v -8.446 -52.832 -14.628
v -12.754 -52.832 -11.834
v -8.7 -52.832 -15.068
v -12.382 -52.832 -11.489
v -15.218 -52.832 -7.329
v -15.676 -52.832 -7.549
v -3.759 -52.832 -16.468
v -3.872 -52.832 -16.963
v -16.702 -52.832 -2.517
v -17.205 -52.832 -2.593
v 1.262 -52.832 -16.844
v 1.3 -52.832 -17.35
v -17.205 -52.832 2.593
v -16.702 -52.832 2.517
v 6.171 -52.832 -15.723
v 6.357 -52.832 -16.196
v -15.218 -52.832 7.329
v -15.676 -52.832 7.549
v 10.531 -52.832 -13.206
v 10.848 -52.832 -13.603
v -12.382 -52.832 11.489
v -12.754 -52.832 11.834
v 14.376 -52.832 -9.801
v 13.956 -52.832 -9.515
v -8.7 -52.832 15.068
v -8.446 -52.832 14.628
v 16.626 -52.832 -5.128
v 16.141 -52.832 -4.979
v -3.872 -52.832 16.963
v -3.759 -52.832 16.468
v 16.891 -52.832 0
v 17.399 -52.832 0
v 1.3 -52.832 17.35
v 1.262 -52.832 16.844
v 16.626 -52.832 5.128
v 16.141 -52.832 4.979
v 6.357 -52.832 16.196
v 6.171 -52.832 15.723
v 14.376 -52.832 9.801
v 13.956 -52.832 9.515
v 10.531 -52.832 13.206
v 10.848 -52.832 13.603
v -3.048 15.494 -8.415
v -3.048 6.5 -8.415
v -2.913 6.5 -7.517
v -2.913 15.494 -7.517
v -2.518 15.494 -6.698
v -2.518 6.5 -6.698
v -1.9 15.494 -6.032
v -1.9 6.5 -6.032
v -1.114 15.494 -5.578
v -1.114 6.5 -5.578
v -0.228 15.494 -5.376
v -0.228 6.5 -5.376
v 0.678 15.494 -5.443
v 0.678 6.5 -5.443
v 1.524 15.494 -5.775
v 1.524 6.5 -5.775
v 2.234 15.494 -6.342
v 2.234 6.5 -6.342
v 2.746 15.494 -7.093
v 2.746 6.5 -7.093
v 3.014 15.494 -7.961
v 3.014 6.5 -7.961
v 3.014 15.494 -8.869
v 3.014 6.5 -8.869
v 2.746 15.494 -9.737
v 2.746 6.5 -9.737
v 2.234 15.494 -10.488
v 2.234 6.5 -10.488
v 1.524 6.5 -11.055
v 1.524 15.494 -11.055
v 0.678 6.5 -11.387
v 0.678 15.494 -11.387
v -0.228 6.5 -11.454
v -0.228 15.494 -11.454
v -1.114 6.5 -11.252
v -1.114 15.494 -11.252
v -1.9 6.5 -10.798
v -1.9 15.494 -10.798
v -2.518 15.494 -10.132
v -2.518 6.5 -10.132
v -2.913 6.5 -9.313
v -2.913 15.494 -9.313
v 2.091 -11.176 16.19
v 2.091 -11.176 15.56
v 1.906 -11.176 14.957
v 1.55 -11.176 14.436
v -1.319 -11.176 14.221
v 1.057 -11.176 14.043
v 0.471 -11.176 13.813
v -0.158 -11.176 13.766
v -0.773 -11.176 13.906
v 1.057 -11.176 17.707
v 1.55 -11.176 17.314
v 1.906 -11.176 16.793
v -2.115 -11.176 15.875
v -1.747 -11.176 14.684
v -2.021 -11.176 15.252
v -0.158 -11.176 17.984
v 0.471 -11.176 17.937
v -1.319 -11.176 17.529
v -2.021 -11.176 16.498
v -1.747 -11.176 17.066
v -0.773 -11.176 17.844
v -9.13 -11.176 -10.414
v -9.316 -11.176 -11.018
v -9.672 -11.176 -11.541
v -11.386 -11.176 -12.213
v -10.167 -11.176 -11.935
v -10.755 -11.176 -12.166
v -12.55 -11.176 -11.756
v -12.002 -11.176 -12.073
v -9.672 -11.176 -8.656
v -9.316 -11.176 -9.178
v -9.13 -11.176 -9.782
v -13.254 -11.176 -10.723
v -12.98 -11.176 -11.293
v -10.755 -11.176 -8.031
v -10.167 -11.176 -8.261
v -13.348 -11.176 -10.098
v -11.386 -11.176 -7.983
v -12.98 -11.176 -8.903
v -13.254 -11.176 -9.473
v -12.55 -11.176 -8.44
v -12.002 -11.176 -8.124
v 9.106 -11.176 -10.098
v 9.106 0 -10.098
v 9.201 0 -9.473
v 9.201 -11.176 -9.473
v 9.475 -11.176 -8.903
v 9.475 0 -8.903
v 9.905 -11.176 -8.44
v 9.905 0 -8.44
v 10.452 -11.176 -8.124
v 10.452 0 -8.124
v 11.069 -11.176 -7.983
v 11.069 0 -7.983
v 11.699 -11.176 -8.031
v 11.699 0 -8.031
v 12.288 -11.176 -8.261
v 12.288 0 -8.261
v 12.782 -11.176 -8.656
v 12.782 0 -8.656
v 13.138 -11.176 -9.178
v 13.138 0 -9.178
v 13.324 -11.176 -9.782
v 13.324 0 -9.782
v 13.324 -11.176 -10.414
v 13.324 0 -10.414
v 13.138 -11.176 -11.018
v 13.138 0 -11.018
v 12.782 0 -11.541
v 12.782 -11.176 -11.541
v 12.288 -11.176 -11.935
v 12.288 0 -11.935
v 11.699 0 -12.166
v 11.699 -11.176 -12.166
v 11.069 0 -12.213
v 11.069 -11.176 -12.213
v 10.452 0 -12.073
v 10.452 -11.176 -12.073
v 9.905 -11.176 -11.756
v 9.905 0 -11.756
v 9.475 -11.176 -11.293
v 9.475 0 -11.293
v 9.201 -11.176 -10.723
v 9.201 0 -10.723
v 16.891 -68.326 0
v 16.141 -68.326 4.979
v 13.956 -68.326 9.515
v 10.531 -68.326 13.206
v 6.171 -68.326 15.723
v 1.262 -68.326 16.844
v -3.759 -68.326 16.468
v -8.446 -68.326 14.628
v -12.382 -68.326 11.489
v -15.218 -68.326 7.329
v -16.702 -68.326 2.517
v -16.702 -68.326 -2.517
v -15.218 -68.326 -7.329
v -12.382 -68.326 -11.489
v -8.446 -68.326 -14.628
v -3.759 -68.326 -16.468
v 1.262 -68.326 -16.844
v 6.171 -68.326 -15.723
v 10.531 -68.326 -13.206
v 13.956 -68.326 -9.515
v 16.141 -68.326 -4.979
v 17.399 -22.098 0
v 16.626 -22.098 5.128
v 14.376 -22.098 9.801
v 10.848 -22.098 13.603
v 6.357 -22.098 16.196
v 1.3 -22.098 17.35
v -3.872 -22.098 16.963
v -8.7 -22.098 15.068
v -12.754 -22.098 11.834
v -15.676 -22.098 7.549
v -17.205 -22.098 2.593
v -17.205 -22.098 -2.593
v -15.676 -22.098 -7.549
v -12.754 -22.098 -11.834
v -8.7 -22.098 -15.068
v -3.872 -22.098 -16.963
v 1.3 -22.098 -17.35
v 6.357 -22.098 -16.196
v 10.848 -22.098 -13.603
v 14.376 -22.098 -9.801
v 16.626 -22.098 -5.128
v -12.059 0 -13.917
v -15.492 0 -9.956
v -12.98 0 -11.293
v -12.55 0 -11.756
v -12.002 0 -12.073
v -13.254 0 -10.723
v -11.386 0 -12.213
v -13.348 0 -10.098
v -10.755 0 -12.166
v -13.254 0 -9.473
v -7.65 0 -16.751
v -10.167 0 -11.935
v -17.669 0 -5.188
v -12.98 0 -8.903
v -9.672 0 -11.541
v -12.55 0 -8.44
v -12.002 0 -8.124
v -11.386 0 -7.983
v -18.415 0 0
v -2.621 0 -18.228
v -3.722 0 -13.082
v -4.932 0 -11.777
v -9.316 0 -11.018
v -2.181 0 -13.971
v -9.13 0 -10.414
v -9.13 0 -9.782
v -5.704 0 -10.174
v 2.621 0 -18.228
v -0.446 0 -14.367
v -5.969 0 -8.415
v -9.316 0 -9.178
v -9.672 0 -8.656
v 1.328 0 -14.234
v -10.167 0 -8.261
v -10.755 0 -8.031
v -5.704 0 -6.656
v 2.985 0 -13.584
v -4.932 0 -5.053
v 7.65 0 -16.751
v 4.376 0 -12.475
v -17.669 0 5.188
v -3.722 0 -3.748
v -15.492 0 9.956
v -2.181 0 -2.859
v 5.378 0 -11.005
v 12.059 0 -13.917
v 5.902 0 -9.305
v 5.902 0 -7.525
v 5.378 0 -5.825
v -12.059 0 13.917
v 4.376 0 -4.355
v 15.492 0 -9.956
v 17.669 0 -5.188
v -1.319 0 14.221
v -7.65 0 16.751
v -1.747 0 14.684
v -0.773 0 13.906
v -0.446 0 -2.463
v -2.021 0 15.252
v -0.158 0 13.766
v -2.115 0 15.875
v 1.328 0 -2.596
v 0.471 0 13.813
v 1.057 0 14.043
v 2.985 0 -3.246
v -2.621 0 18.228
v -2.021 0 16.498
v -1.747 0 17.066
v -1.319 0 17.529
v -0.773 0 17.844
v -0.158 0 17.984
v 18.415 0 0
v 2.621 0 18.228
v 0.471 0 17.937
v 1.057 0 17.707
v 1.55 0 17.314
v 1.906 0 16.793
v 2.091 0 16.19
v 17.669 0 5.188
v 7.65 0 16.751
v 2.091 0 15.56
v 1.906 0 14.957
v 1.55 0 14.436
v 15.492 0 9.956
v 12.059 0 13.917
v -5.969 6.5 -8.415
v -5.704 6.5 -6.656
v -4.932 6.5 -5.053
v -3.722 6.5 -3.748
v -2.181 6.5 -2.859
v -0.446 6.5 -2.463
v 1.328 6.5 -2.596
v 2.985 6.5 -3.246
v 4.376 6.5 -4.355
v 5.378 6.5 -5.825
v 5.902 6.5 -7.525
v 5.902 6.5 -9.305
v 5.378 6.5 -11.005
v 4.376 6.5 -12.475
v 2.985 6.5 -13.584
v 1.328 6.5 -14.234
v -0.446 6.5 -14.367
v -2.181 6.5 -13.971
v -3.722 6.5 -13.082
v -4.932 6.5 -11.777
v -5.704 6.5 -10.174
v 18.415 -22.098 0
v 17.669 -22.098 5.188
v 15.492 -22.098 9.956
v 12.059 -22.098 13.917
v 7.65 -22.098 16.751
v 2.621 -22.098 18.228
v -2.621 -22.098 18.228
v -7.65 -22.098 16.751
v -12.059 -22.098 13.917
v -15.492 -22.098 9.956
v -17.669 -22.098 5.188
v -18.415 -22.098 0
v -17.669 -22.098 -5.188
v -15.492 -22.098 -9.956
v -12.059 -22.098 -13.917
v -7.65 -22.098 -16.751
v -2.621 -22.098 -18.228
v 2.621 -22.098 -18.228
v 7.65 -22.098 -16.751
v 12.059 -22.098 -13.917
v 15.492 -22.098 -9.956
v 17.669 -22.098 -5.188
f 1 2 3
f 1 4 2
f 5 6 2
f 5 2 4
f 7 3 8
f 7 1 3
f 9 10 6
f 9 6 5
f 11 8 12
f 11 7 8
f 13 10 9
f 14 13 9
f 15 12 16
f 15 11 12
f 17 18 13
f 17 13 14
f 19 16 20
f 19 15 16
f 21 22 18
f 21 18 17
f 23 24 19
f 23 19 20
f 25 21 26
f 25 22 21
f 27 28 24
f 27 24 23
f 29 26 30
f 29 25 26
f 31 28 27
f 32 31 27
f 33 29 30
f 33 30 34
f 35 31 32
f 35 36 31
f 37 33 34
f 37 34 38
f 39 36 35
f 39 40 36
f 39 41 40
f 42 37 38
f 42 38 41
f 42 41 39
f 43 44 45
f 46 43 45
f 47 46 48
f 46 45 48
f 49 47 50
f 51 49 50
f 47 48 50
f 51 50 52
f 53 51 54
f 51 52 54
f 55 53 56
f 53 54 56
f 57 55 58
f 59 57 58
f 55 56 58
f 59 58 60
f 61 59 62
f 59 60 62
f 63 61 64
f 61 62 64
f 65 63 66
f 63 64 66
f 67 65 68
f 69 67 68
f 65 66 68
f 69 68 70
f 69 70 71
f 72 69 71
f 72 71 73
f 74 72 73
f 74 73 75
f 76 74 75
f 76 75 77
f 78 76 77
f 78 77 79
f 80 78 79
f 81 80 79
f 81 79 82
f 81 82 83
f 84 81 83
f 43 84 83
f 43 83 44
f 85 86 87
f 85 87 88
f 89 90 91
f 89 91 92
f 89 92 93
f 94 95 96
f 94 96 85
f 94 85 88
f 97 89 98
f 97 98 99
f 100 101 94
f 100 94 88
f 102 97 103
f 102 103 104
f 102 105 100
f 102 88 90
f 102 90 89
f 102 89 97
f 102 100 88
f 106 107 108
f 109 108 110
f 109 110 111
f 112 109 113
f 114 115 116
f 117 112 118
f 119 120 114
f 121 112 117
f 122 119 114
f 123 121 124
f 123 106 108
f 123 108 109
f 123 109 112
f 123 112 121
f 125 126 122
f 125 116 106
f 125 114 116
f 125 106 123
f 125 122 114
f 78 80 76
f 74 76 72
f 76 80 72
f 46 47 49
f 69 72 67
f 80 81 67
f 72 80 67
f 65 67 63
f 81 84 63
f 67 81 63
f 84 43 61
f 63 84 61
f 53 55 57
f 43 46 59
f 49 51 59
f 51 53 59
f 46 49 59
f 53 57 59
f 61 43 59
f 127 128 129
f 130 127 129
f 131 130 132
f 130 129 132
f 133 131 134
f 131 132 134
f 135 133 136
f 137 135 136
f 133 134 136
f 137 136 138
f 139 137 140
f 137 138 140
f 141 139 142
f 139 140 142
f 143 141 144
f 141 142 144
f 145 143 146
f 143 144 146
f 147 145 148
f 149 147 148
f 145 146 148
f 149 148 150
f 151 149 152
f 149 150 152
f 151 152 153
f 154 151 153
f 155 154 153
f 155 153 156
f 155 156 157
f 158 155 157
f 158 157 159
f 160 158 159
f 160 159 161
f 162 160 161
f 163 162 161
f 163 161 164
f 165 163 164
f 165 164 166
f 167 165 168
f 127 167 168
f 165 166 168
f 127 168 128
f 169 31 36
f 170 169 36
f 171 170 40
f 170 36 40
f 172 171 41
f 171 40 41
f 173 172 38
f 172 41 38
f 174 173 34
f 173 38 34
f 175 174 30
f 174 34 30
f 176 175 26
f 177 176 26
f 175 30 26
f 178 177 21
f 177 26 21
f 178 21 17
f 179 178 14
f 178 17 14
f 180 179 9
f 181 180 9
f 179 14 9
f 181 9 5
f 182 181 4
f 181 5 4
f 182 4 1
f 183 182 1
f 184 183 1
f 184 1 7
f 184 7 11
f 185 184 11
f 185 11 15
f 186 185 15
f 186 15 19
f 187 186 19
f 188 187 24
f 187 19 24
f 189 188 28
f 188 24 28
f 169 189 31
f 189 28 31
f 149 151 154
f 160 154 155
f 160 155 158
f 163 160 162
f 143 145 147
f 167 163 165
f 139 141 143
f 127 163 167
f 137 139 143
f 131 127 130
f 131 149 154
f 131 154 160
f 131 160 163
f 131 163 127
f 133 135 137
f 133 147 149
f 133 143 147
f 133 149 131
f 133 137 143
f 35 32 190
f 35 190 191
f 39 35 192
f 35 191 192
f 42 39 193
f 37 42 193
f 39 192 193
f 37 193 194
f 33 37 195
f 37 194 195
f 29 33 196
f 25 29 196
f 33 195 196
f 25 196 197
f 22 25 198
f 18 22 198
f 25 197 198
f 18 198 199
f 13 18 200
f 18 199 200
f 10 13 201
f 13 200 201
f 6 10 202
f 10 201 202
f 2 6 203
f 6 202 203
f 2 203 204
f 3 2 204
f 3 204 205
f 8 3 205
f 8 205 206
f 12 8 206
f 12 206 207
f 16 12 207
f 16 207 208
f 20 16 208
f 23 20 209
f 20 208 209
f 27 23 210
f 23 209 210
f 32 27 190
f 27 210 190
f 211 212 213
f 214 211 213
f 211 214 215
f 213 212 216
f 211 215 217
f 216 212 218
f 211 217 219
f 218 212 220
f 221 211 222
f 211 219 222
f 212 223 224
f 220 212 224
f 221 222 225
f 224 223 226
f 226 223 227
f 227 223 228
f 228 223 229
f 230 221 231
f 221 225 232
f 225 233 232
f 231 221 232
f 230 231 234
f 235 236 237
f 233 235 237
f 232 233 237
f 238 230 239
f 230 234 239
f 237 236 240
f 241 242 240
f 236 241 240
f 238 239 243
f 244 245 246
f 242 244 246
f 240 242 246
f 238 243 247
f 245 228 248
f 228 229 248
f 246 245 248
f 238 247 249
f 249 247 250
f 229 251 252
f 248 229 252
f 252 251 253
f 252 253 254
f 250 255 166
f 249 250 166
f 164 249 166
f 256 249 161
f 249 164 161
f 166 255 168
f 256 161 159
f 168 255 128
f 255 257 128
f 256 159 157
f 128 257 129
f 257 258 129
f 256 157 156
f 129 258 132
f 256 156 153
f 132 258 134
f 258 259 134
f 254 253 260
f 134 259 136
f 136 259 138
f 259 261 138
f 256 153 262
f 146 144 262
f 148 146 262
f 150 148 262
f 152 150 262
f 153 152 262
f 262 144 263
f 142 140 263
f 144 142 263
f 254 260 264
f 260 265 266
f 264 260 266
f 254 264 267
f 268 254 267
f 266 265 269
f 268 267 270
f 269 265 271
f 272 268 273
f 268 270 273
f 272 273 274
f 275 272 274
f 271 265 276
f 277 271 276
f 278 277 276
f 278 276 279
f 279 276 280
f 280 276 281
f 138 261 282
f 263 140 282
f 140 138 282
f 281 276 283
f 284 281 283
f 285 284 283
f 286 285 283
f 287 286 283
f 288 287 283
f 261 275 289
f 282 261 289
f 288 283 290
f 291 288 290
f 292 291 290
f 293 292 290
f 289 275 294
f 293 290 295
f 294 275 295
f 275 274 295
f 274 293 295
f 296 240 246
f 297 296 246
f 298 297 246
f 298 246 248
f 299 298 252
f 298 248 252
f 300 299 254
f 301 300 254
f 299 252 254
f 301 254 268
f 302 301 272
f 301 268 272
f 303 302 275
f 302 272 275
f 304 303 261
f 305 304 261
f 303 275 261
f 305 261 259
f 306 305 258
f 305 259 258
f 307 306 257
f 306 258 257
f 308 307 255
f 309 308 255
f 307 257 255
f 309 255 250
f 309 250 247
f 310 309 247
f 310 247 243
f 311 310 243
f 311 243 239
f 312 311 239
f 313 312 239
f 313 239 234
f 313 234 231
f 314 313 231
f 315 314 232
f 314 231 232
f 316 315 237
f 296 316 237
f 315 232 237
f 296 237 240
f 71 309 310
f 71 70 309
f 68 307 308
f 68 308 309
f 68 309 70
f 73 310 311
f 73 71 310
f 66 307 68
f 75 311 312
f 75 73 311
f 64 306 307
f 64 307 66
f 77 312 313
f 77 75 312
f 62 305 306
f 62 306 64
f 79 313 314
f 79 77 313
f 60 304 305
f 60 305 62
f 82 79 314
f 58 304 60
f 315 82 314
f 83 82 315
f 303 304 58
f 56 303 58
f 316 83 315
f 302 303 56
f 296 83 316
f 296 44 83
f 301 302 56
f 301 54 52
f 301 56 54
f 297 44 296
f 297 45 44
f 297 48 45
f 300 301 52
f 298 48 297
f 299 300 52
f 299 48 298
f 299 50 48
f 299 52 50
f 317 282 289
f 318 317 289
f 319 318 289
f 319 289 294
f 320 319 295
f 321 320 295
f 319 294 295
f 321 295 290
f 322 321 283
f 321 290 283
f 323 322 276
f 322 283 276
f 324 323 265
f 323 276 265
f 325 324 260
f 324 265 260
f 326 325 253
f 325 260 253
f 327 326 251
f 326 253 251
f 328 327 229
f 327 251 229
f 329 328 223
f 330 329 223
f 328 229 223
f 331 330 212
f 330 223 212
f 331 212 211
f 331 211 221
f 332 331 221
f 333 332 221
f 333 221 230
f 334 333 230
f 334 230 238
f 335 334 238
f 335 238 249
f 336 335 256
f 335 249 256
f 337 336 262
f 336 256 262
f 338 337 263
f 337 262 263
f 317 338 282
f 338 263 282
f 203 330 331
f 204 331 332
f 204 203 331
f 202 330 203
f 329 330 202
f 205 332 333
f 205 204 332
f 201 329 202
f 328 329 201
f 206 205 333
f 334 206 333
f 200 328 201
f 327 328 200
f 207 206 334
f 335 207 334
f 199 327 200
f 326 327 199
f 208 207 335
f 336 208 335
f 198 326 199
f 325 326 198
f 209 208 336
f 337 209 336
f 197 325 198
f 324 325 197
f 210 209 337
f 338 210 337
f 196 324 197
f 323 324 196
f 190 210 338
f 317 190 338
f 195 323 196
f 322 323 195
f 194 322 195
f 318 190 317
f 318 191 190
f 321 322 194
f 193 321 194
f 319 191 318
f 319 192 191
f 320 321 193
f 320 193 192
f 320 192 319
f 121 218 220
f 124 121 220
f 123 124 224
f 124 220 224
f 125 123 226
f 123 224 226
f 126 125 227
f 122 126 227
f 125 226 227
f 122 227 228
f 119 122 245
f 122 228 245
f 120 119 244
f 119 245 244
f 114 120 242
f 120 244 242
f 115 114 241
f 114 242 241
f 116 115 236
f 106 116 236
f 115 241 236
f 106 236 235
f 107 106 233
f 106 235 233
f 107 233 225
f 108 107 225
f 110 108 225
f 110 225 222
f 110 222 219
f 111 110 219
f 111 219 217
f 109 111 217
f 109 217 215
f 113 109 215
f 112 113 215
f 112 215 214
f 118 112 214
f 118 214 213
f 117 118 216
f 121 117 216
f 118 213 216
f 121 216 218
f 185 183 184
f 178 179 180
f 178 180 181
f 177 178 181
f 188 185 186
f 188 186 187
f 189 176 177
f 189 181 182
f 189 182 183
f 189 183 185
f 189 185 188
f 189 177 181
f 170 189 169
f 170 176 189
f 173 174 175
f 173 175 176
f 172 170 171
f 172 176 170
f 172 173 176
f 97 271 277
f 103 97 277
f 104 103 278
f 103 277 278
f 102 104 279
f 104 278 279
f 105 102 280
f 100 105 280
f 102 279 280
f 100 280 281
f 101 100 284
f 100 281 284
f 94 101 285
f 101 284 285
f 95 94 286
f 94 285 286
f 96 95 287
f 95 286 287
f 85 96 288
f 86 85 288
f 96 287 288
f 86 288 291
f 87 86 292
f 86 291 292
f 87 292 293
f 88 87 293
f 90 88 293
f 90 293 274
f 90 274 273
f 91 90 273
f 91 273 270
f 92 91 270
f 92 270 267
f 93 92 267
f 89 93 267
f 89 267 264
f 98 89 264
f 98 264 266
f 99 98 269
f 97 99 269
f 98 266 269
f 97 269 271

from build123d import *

# Parameters (mm, degrees)
F0_R      = 18.415
F1_DEPTH  = 22.098
F2_R      = 5.969
F2_R_2    = 3.048
F3_DEPTH  = 6.5
F4_DEPTH  = 15.494
F5_R      = 17.399
F6_DEPTH  = 30.734
F7_R      = 16.891
F8_DEPTH  = 15.494
F9_R      = 2.1209
F9_R_2    = 2.11499958
F10_DEPTH = 11.176


with BuildPart() as f1:
    # F0 (on Front) → F1 (new body)
    with BuildSketch(Plane.XZ):
        Circle(F0_R)
    extrude(amount=F1_DEPTH)

    # F2 (on face) → F3 (join)
    with BuildSketch(Plane(origin=(0, 0, 0), x_dir=(-1, 0, 0), z_dir=(0, 1, 0))):
        with Locations((0, -8.4149946)):
            Circle(F2_R)
        with Locations((0, -8.4149946)):
            Circle(F2_R_2, mode=Mode.SUBTRACT)
    extrude(amount=F3_DEPTH)

    # F4 (add): a face of the model
    f4_faces = [f1.faces().sort_by_distance(p)[0] for p in [
        (0, 0, -8.4149946),
    ]]
    extrude(f4_faces, amount=F4_DEPTH)

    # F5 (on face) → F6 (join)
    with BuildSketch(Plane.XZ.offset(22.098)):
        Circle(F5_R)
    extrude(amount=F6_DEPTH)

    # F7 (on face) → F8 (join)
    with BuildSketch(Plane.XZ.offset(52.832)):
        Circle(F7_R)
    extrude(amount=F8_DEPTH)

    # F9 (on face) → F10 (cut)
    with BuildSketch(Plane(origin=(0, 0, 0), x_dir=(-1, 0, 0), z_dir=(0, 1, 0))):
        with Locations((-11.2272249535, -10.0982319564)):
            Circle(F9_R)
        with Locations((0, 15.875)):
            Circle(F9_R_2)
        with Locations((11.2272249535, -10.0982319564)):
            Circle(F9_R)
    extrude(amount=-F10_DEPTH, mode=Mode.SUBTRACT)


solid = f1.part
